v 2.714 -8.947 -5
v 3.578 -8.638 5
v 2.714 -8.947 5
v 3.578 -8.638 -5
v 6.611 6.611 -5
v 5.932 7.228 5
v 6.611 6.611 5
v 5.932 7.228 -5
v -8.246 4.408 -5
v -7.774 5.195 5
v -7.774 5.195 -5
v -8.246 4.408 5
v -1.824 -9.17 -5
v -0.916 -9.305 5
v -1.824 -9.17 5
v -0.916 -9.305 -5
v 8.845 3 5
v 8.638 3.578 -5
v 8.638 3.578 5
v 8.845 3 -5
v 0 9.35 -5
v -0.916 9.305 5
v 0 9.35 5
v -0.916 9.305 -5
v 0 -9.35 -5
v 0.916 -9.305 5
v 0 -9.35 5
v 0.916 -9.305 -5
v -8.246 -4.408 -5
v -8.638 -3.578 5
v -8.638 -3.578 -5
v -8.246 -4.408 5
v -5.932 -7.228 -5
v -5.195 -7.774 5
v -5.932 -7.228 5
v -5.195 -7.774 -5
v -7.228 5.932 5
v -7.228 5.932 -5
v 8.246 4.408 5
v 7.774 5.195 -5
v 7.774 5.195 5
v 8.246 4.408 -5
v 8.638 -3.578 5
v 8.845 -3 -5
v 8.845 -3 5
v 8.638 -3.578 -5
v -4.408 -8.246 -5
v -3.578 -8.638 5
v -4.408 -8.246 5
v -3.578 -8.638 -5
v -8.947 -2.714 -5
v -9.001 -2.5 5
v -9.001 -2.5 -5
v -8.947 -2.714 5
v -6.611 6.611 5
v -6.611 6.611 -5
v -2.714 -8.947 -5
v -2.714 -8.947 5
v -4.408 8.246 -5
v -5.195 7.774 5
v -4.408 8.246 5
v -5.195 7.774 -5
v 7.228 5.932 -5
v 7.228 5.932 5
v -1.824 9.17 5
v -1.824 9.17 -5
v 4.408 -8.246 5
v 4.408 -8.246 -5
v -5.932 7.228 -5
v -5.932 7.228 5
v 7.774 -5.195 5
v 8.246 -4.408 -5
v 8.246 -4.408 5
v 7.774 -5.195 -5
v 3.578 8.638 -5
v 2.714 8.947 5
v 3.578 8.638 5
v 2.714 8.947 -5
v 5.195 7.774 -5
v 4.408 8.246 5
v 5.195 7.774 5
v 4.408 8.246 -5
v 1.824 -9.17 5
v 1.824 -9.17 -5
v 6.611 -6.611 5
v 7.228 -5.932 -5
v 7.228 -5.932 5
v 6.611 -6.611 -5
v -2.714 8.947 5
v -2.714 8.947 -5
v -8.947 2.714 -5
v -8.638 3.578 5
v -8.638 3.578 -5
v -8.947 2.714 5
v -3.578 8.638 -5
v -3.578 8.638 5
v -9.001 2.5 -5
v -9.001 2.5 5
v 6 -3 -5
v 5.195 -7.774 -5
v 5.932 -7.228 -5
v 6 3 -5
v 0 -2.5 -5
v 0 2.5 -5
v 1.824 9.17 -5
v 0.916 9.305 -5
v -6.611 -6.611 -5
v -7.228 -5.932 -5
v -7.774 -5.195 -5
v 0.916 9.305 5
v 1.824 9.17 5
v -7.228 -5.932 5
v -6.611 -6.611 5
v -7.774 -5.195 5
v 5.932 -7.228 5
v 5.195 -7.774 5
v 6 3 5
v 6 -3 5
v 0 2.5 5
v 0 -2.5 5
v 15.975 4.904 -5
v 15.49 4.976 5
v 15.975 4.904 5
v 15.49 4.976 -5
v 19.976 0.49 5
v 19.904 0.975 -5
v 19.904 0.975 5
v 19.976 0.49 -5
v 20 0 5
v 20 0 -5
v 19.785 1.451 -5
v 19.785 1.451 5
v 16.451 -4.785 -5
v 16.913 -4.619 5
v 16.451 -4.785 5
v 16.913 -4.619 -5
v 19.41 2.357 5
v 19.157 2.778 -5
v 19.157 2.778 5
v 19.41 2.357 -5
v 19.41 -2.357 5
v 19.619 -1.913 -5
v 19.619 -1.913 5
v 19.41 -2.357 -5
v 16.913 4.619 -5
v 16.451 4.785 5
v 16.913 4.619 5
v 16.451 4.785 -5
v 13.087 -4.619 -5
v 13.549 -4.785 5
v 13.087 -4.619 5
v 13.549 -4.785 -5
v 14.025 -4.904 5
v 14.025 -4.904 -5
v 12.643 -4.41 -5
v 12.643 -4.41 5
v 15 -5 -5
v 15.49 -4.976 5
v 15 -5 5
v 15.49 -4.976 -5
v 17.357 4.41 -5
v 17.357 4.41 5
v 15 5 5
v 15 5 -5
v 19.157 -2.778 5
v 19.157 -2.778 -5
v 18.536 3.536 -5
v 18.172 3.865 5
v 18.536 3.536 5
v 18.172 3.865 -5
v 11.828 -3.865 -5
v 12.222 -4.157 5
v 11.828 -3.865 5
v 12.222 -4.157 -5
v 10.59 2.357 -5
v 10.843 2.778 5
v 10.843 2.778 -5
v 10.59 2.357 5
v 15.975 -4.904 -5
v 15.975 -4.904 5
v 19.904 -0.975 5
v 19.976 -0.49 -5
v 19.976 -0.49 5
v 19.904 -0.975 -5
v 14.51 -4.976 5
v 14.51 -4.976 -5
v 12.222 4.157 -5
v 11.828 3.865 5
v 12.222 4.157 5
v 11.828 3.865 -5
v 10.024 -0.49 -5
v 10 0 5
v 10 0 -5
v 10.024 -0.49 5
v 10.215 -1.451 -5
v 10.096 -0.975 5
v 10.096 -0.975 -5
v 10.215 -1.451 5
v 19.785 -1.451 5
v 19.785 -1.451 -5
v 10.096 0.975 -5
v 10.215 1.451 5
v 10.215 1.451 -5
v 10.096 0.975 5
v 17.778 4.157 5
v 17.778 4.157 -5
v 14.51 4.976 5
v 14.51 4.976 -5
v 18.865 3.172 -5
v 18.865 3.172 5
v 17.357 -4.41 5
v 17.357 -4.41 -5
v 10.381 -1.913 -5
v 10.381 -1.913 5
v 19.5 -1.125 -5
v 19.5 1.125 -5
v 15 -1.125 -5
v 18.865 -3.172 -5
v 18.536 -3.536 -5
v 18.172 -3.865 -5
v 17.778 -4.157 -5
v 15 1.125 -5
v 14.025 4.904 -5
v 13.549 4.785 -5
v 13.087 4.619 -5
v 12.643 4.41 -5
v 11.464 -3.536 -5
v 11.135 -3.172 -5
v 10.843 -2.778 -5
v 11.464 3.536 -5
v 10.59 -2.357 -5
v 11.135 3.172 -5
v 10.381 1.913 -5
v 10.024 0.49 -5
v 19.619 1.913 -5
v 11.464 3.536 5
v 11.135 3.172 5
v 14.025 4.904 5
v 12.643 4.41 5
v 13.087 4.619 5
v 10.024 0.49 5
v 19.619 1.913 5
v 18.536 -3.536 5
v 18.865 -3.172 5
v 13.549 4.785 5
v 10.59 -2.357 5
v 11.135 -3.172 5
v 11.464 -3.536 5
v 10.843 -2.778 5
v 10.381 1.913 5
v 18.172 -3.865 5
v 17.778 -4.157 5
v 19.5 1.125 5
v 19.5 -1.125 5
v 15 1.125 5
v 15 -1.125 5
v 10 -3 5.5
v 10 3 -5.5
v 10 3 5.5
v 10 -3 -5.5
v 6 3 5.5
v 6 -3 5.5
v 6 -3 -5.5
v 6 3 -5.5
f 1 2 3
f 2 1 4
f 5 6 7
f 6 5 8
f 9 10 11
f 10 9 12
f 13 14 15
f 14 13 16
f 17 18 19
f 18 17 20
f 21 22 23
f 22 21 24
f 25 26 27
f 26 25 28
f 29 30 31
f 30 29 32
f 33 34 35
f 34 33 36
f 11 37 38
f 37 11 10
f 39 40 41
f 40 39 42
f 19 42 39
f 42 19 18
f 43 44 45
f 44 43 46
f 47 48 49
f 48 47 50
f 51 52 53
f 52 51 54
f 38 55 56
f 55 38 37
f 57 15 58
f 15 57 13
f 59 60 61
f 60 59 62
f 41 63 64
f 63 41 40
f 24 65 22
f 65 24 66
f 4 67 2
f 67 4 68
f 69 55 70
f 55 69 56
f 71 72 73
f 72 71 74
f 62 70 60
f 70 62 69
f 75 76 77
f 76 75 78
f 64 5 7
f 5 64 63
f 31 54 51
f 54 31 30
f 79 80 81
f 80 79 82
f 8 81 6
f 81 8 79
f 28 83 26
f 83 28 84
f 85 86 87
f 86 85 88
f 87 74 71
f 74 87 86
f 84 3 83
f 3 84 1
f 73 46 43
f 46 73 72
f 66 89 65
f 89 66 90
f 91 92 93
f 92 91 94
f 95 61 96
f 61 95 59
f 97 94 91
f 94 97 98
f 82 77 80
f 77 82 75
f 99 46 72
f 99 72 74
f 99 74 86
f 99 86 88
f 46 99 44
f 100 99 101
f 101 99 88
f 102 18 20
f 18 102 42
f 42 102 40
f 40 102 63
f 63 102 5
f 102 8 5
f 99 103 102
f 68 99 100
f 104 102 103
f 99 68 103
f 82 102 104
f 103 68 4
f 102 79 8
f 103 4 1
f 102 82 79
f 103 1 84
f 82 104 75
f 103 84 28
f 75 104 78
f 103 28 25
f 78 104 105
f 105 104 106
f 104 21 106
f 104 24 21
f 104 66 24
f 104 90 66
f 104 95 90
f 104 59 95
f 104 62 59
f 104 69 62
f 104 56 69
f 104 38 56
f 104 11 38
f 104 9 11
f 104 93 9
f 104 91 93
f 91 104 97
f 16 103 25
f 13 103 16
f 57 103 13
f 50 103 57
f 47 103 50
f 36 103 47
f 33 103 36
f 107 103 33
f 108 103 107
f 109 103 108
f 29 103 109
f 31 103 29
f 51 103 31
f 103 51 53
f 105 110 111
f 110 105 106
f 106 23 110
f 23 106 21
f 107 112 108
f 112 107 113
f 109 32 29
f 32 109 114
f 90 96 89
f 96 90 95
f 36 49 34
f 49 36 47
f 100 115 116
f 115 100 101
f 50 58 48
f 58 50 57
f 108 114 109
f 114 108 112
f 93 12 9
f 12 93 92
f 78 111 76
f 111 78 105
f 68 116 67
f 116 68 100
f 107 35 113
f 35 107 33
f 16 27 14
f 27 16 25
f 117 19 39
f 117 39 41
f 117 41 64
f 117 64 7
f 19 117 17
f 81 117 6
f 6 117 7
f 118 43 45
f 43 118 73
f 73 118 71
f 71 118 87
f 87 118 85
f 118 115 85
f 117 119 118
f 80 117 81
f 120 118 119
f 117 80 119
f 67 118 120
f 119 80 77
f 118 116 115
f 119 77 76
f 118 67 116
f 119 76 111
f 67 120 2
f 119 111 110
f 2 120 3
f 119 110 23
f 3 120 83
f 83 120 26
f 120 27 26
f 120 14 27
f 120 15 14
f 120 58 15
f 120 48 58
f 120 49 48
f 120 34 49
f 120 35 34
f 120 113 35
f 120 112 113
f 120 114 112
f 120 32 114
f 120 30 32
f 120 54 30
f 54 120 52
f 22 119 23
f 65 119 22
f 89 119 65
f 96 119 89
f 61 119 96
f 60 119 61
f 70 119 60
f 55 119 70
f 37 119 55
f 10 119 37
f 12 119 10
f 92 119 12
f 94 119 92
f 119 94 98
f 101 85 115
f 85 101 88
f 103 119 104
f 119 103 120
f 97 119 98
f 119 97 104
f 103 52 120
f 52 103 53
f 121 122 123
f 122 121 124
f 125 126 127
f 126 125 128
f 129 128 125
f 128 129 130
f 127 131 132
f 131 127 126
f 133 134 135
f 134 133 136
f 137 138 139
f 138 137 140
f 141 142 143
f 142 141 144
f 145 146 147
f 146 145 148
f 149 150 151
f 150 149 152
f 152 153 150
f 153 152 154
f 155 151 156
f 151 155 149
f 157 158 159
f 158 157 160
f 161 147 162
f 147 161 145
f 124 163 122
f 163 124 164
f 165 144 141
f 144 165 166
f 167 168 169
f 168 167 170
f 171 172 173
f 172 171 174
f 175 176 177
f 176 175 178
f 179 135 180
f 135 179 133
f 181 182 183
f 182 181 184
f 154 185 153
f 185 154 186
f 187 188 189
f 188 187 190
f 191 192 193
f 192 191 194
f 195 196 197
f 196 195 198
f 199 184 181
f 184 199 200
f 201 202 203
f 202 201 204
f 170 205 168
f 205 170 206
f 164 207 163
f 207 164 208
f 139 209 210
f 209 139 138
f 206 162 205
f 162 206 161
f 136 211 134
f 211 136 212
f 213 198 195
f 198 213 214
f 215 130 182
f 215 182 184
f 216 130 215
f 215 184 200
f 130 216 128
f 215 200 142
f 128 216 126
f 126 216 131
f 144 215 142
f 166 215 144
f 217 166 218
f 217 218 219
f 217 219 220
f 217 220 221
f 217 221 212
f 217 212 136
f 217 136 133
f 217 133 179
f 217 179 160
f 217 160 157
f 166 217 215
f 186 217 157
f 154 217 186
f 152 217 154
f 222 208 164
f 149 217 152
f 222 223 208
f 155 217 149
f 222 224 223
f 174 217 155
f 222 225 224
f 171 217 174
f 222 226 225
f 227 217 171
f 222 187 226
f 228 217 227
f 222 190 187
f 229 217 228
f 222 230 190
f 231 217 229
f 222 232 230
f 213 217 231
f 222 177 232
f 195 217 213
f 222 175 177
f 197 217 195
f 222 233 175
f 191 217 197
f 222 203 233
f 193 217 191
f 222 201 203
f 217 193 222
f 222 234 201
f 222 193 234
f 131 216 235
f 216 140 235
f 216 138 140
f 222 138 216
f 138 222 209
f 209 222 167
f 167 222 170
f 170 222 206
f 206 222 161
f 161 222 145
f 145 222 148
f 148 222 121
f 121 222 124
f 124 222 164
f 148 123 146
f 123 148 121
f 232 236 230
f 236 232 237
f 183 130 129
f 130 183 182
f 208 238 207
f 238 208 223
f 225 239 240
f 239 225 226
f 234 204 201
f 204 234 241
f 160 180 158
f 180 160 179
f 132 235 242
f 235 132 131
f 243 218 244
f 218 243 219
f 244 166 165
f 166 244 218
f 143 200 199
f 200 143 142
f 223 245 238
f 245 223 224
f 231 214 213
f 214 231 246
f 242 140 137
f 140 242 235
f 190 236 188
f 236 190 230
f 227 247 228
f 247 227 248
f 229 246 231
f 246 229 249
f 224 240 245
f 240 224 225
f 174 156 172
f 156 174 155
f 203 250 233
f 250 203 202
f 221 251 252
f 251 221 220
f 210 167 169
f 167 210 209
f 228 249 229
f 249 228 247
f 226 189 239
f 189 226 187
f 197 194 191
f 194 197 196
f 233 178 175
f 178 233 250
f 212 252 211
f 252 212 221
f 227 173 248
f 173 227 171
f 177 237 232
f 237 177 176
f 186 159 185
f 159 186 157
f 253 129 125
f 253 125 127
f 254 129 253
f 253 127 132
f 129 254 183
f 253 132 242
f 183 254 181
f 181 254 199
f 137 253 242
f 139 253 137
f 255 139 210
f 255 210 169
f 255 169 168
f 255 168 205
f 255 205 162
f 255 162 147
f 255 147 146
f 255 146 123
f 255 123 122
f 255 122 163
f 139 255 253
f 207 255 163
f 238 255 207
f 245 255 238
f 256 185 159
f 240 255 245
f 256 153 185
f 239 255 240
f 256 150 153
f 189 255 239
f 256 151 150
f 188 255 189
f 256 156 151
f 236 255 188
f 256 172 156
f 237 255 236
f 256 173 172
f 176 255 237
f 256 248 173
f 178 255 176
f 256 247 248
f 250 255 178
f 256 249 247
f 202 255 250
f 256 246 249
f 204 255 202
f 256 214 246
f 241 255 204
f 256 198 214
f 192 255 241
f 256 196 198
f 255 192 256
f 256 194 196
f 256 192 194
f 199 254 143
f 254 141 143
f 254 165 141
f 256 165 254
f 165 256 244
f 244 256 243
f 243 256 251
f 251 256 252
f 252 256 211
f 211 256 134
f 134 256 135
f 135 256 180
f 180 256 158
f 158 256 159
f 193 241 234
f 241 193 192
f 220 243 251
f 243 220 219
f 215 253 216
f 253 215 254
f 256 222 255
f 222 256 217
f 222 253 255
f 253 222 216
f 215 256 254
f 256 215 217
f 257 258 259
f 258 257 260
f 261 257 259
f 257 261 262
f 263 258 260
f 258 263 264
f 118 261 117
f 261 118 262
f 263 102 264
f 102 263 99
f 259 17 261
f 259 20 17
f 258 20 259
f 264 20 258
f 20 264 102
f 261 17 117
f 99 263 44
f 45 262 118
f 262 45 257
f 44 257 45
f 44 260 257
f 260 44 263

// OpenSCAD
$fn = 64;

// Dimensions
rod_diameter = 12.7;       // 1/2 inch lab stand rod
rod_wall = 3.0;            // Wall thickness of the rod ring
rod_ring_z = 10.0;         // Height of the extrusion
rod_ring_opening_w = 10.0; // Width of the opening on the -X side
rod_ring_opening_h = 5.0;  // Height of the opening on the -X side

tubing_diameter = 6.0;     // Inner diameter of the tubing ring
tubing_wall = 2.0;         // Wall thickness of the tubing ring
tubing_ring_x = 15.0;      // X position of the tubing ring
tubing_ring_opening_w = 4.5; // Width of the opening on the +X side
tubing_ring_opening_h = 2.25; // Height of the opening on the +X side

bridge_x_start = 8.0;      // X start of the bridge
bridge_x_end = 12.0;       // X end of the bridge
bridge_y = 0.0;            // Y position of the bridge

// Derived Dimensions
rod_outer_diameter = rod_diameter + (2 * rod_wall);
tubing_outer_diameter = tubing_diameter + (2 * tubing_wall);

// Build the clip
union() {
    // 1. Rod Ring (with opening on -X side)
    difference() {
        cylinder(h = rod_ring_z, r = rod_outer_diameter / 2, center = true);
        
        // Cut the opening on the -X side
        translate([-rod_ring_opening_w / 2, 0, 0])
        cube([rod_ring_opening_w, rod_ring_opening_h, rod_ring_z + 1], center = true);
    }

    // 2. Tubing Ring (centered at x = 15, y = 0)
    translate([tubing_ring_x, 0, 0]) {
        difference() {
            cylinder(h = rod_ring_z, r = tubing_outer_diameter / 2, center = true);
            
            // Cut the opening on the +X side
            translate([tubing_ring_opening_w / 2, 0, 0])
            cube([tubing_ring_opening_w, tubing_ring_opening_h, rod_ring_z + 1], center = true);
        }
    }

    // 3. Solid Bridge (joining the two rings)
    translate([bridge_x_start, bridge_y, 0]) {
        // Calculate bridge width based on the gap between the rod ring and tubing ring
        // Rod ring outer edge is at x = rod_outer_diameter / 2
        // Tubing ring inner edge is at x = tubing_ring_x - tubing_outer_diameter / 2
        bridge_width = tubing_ring_x - (tubing_outer_diameter / 2) - (rod_outer_diameter / 2);
        
        // Ensure bridge doesn't overlap the rod ring opening or tubing ring opening
        // The rod ring opening starts at x = -rod_ring_opening_w / 2
        // The tubing ring opening ends at x = tubing_ring_x + tubing_ring_opening_w / 2
        
        // Adjust start to be just after the rod ring opening
        let(start_x = max(bridge_x_start, rod_ring_opening_w / 2 + 0.1))
        // Adjust end to be just before the tubing ring opening
        let(end_x = min(bridge_x_end, tubing_ring_x - tubing_ring_opening_w / 2 - 0.1))
        
        if (end_x > start_x) {
            cube([end_x - start_x, 6, rod_ring_z + 1], center = true);
        }
    }
}
